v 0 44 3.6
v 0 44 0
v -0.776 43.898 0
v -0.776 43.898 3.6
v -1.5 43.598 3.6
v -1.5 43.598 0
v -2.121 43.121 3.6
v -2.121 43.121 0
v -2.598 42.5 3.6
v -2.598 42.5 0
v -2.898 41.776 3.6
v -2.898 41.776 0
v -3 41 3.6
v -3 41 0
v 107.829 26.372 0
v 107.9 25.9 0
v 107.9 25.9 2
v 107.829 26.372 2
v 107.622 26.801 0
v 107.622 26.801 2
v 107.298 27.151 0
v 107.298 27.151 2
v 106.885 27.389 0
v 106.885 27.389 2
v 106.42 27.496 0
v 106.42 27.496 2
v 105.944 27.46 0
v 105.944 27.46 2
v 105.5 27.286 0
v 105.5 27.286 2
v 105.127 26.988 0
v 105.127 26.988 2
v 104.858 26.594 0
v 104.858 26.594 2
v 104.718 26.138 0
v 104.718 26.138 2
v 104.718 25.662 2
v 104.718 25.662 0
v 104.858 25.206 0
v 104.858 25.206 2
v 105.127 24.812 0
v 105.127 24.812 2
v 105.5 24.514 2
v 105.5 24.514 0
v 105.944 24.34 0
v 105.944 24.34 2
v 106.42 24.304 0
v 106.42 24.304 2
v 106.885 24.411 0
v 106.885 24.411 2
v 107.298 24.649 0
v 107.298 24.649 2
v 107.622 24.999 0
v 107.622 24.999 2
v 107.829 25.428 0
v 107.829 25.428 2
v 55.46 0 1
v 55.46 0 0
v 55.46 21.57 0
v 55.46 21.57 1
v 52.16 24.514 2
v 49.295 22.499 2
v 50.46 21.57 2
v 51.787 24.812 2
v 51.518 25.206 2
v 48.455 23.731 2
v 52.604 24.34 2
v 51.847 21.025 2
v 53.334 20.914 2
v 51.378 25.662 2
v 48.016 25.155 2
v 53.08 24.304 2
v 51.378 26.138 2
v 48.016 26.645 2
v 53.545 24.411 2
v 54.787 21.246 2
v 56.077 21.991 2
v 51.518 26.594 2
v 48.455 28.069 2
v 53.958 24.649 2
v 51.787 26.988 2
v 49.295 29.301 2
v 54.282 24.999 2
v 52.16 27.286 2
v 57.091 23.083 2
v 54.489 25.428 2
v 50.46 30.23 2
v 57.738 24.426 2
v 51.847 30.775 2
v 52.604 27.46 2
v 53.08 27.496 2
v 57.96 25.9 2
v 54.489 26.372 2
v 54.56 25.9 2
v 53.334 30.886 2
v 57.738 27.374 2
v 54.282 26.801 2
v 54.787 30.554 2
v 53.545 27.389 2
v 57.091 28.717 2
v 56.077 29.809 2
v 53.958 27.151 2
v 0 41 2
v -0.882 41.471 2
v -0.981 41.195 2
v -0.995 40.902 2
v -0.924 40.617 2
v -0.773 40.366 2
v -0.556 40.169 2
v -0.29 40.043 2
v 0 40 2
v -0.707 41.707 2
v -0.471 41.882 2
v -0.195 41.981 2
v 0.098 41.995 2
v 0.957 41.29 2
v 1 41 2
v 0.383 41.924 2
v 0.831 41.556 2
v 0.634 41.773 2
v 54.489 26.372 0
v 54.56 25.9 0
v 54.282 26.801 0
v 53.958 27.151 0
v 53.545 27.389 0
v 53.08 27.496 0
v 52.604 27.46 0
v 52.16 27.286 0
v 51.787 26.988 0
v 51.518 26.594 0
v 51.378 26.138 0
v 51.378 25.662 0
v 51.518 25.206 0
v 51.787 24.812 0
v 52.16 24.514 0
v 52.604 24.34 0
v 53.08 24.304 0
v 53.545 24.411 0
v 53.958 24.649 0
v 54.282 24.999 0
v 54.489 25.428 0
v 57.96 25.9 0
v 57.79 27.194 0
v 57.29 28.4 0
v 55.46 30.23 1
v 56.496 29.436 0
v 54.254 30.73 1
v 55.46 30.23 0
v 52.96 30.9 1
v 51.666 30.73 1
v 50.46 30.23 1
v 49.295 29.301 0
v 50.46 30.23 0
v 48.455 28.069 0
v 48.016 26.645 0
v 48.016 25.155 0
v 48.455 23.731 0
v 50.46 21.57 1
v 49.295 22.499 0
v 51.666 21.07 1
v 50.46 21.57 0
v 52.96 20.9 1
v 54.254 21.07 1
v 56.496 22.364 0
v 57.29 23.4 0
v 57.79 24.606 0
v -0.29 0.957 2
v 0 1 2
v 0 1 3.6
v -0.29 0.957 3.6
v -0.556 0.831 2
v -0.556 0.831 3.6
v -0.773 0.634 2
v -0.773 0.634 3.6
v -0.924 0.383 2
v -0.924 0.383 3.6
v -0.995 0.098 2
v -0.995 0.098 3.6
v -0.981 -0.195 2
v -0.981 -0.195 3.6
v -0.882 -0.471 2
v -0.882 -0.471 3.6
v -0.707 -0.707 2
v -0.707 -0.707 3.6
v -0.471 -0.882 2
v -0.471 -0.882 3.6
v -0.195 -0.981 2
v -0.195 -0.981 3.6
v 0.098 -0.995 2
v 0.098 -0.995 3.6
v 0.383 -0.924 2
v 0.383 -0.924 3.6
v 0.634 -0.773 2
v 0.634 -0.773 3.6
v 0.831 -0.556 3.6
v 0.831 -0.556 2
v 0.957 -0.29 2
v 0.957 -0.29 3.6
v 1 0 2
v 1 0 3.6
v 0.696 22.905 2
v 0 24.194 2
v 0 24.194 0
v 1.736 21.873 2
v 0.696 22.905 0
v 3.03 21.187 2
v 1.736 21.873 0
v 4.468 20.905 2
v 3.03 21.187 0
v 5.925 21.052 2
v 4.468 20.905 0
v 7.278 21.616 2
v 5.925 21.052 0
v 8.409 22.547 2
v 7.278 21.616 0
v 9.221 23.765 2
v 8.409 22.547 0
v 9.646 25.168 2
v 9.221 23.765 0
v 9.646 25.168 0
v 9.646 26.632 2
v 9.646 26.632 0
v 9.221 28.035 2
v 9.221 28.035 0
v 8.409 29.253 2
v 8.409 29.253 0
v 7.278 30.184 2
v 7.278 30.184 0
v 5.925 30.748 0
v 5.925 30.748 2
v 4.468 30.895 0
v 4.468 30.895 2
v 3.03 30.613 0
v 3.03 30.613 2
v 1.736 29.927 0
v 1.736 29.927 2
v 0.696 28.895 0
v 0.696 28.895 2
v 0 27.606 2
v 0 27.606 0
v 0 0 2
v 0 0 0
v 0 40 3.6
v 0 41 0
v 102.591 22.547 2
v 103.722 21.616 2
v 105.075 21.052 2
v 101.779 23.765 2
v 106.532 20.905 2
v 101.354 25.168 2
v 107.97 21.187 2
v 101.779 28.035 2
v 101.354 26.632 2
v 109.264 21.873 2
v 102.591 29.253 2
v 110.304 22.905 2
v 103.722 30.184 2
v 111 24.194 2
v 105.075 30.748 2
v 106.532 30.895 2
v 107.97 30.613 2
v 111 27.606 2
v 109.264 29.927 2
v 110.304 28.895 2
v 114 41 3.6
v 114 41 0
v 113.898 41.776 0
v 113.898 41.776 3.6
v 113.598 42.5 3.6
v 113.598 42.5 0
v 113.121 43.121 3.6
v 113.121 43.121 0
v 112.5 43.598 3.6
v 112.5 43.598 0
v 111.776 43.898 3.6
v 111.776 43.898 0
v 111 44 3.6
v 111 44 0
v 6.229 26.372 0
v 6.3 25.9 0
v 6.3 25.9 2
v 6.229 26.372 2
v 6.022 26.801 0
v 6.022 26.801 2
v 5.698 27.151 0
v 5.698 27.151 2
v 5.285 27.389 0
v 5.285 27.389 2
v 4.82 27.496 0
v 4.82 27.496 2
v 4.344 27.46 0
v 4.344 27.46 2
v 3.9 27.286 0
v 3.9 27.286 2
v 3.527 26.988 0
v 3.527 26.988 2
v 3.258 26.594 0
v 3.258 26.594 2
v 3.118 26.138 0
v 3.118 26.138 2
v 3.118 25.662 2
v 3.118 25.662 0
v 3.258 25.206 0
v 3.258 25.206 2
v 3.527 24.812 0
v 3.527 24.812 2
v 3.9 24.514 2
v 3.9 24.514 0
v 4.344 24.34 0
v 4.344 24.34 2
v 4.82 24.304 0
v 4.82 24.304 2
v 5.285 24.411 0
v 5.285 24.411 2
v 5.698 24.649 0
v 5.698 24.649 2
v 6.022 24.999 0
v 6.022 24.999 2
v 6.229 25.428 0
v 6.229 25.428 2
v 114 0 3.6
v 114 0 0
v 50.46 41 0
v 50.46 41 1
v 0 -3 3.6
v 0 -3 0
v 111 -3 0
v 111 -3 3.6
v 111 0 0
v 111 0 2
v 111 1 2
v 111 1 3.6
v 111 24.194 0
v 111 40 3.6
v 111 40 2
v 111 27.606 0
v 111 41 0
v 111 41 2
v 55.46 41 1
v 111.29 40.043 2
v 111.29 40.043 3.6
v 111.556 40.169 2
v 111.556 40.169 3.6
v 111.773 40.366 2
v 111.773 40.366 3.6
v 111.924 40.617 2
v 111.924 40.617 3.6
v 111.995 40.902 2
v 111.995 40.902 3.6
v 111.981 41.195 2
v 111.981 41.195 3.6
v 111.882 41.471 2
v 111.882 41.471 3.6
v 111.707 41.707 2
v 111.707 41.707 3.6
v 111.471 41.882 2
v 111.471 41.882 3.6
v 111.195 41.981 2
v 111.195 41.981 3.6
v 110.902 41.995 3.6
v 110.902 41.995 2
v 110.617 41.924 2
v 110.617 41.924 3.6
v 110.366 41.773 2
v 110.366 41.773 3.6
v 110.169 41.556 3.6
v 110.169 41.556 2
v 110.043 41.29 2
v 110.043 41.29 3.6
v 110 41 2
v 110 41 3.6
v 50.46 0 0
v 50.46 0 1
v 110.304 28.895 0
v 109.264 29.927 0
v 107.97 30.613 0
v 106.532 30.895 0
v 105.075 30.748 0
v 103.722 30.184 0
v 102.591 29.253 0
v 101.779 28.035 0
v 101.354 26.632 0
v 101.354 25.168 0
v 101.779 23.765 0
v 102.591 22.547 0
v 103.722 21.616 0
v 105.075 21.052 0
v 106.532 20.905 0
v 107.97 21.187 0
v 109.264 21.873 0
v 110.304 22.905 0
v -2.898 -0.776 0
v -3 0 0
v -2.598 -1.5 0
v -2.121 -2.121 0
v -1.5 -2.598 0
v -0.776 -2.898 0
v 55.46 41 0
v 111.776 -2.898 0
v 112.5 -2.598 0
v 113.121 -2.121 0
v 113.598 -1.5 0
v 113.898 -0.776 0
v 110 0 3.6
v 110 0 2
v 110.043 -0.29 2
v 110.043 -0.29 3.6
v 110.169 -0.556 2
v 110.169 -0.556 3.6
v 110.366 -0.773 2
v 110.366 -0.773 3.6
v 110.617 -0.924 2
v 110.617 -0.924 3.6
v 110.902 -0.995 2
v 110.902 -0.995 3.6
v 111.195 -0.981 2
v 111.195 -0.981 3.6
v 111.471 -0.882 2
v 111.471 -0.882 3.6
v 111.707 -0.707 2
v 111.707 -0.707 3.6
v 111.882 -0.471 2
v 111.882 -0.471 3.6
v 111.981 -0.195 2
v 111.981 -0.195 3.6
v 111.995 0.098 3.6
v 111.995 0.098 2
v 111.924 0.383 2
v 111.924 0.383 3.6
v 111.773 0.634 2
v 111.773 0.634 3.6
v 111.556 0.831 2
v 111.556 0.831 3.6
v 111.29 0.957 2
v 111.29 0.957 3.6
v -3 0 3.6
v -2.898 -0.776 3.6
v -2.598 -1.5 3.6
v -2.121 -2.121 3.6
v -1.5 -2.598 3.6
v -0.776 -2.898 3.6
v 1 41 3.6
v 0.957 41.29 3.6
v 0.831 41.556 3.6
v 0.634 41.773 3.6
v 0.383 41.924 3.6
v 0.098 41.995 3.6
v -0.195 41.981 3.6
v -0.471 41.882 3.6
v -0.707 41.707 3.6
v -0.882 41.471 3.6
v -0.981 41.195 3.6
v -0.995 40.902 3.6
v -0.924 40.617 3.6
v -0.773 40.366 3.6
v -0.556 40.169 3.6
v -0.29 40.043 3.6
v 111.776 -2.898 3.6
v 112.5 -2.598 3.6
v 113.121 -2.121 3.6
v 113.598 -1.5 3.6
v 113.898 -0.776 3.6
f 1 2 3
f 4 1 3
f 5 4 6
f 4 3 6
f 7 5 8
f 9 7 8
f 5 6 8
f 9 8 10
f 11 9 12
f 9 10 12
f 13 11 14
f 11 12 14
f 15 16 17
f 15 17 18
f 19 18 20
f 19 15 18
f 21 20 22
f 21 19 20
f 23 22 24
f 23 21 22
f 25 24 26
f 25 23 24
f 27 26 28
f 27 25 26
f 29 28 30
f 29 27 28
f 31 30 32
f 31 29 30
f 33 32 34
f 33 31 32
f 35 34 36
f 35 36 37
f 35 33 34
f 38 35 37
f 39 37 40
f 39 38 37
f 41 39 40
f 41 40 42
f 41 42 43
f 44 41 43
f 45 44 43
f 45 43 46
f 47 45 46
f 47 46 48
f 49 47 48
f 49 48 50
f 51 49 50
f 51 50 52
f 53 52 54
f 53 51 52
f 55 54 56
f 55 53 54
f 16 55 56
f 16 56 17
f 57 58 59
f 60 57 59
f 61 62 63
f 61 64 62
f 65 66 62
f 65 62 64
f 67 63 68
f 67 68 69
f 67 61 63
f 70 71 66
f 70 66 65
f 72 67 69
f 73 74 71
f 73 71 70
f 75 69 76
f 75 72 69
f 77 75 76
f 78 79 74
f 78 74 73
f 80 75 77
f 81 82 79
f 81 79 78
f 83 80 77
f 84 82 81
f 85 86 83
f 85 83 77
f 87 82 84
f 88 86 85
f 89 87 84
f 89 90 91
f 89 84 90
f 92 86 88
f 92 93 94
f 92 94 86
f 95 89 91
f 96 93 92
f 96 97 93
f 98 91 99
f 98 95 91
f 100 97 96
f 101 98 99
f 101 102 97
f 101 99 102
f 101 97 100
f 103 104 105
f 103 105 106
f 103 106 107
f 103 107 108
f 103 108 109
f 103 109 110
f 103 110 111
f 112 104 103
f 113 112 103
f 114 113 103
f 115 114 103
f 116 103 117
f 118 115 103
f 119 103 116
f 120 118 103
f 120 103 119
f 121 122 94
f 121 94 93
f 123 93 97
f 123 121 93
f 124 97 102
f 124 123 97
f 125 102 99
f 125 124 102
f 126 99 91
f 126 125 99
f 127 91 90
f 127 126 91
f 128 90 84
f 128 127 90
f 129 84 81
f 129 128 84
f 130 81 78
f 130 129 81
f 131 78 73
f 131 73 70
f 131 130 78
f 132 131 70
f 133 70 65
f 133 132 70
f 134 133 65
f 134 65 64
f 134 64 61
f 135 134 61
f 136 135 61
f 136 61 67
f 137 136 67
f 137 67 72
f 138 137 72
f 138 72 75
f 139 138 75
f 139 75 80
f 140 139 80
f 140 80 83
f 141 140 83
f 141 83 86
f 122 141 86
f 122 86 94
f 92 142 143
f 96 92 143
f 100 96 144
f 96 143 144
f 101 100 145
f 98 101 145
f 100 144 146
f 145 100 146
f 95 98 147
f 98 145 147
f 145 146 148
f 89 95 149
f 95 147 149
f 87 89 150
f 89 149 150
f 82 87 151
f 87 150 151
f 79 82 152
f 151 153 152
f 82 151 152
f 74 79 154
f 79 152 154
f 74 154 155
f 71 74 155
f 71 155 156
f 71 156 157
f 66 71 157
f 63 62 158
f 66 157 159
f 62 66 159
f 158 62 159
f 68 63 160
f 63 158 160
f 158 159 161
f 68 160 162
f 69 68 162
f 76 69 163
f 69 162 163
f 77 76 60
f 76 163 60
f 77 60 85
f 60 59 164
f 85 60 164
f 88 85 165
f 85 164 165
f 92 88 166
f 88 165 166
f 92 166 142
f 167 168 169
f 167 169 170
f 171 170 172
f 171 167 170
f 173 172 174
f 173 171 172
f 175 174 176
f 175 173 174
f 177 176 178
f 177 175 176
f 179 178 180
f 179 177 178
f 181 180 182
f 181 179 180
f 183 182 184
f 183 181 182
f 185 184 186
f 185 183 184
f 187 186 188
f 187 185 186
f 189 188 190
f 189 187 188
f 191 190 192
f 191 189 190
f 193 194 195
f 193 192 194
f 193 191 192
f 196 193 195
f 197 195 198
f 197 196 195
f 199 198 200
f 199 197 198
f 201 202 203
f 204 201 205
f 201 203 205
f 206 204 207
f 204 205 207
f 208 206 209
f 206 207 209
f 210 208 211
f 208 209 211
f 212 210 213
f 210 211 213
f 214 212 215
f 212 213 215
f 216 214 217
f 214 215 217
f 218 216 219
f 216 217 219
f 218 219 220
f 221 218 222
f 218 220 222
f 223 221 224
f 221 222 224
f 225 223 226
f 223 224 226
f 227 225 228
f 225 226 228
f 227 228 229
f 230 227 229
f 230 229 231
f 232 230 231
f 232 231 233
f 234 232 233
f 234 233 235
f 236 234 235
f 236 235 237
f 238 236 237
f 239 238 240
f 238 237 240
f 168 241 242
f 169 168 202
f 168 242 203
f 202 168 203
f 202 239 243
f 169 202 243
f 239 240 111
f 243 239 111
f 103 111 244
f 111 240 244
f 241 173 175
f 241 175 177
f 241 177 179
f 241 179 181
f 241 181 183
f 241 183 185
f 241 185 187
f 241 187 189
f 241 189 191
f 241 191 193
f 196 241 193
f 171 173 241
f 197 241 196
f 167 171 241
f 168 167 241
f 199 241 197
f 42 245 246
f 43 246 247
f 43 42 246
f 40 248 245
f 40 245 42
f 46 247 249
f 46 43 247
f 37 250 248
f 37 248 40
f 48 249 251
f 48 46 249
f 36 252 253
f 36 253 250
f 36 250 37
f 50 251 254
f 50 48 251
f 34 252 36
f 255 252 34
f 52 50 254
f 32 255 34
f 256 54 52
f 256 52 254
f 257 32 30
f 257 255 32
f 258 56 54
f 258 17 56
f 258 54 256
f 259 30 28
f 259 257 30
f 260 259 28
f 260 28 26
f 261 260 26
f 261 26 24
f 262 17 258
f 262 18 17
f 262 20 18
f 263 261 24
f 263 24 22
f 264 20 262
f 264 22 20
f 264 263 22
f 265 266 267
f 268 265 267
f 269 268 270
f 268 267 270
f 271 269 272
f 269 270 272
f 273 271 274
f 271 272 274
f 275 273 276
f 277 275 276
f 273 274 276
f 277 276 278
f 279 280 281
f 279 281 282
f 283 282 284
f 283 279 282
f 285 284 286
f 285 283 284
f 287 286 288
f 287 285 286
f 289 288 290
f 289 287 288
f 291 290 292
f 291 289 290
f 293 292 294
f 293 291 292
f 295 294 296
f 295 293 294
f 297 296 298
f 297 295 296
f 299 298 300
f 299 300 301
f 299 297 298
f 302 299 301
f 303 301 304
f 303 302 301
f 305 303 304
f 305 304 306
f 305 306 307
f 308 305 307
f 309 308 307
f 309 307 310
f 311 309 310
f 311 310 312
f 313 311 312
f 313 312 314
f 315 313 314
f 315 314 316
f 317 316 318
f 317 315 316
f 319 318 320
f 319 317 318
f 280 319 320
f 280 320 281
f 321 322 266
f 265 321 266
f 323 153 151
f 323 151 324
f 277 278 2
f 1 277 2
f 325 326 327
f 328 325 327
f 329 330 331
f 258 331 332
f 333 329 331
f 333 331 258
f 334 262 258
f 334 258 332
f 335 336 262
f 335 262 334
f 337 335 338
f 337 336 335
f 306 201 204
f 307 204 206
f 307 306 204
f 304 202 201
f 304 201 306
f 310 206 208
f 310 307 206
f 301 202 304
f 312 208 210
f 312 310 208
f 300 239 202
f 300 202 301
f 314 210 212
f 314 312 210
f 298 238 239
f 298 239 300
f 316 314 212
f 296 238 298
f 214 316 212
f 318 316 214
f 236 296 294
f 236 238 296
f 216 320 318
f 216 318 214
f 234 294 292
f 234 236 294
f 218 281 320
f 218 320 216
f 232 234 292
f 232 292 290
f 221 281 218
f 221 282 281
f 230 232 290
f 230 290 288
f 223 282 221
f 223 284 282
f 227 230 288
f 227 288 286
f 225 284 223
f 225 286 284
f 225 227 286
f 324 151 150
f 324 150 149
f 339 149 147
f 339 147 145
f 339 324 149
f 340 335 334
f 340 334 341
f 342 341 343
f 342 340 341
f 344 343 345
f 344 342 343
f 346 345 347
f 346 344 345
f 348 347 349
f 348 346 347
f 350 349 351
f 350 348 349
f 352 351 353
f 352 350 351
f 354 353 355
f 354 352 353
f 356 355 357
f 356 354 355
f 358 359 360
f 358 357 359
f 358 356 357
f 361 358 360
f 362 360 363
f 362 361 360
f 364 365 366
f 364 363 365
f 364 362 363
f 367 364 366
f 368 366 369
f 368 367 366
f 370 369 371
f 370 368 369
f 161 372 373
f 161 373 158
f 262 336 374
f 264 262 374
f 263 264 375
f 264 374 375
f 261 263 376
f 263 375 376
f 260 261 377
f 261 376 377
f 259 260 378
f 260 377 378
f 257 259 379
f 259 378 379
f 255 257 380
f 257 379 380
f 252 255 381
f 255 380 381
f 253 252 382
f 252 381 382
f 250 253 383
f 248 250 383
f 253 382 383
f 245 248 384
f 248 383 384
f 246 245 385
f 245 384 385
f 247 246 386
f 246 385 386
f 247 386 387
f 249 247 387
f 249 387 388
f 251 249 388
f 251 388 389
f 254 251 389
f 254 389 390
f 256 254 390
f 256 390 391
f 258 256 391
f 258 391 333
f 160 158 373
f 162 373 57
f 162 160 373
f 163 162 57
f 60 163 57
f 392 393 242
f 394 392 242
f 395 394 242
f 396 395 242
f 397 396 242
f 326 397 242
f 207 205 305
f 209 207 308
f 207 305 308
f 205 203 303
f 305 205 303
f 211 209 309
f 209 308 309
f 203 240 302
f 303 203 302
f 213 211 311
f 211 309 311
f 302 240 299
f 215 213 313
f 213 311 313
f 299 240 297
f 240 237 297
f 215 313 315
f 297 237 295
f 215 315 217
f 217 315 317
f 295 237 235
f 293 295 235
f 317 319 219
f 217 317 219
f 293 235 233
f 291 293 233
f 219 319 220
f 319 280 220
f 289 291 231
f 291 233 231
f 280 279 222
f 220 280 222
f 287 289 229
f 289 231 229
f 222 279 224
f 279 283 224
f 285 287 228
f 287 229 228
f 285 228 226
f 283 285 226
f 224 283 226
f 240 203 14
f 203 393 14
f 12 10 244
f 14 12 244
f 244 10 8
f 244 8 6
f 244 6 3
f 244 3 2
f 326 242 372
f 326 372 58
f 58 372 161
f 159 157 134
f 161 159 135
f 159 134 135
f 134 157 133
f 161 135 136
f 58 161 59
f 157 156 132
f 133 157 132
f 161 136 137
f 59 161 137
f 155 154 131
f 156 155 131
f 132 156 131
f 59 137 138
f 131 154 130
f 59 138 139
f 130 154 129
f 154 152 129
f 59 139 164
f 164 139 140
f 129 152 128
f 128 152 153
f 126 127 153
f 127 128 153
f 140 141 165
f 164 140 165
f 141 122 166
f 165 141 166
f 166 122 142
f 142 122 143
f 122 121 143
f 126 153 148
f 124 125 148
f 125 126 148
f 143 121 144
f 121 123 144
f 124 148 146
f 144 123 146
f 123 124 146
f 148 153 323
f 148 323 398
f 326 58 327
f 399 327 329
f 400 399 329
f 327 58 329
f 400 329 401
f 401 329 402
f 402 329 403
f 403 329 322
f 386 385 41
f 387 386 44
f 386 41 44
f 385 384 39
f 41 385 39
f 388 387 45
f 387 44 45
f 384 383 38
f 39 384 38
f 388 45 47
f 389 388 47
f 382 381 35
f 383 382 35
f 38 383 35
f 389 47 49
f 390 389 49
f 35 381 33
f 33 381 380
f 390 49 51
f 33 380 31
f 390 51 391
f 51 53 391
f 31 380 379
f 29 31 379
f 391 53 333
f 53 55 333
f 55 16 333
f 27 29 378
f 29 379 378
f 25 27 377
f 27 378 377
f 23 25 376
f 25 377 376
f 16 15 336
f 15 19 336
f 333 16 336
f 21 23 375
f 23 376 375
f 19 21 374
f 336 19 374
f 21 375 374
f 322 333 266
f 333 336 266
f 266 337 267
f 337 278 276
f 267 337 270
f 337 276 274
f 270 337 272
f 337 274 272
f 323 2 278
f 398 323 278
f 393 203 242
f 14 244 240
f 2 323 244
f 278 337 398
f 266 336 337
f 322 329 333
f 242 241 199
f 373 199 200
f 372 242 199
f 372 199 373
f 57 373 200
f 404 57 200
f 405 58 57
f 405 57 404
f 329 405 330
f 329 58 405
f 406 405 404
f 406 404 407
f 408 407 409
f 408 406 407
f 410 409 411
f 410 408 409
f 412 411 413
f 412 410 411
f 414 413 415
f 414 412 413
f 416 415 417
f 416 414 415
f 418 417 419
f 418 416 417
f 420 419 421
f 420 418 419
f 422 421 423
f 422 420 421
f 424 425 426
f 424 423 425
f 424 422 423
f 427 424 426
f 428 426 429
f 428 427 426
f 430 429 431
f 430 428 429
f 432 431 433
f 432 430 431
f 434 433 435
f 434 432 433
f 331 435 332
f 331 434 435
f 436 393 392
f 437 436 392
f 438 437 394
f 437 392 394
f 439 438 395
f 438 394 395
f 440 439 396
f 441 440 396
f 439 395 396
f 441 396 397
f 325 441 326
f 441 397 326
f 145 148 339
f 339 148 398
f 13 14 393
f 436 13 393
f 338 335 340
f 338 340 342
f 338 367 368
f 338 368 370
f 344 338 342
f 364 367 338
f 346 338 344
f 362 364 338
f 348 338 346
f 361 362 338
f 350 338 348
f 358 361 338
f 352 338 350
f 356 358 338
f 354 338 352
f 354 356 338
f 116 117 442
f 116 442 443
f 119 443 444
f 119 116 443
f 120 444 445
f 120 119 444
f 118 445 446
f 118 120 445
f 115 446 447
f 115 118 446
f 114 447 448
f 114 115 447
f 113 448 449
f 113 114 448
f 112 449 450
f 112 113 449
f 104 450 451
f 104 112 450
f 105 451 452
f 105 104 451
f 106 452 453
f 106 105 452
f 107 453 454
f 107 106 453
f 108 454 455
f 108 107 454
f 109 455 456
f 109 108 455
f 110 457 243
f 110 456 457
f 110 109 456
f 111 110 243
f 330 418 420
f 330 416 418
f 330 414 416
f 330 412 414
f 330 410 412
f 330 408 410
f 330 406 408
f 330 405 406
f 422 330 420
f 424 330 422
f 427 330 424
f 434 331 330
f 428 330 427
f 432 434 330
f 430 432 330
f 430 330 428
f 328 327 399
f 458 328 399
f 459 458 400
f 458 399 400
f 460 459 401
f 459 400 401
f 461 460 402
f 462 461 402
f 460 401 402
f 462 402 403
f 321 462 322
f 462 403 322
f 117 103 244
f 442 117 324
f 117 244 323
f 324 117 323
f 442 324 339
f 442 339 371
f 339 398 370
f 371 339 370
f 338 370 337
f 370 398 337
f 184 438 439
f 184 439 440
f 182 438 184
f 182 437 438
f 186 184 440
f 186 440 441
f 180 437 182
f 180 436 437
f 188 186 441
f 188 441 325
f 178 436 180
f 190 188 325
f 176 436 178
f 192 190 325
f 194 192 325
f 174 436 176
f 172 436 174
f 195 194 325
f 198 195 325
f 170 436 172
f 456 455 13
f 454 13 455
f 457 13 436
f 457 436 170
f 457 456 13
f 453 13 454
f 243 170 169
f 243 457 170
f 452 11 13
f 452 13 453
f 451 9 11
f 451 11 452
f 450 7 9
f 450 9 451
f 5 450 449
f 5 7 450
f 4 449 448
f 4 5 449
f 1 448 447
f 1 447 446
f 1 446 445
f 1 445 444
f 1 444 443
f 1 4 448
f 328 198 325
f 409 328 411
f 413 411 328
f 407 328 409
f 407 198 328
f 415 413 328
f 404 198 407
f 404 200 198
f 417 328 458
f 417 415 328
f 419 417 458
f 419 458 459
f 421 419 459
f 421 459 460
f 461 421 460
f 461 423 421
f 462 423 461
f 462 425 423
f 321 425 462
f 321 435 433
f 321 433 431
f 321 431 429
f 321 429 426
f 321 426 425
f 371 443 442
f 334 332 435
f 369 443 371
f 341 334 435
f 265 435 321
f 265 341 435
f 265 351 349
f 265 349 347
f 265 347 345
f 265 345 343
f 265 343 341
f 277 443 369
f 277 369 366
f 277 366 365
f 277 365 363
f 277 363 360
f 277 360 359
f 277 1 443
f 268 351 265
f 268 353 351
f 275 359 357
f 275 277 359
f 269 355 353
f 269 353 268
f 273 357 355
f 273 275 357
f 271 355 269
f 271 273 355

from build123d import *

# Parameters (mm, degrees)
SKETCH005_W     = 111
SKETCH005_H     = 41
PAD002_DEPTH    = 3.6
SKETCH006_R     = 5
SKETCH006_R_2   = 1.6
PAD003_DEPTH    = 2
SKETCH007_R     = 1
POCKET001_DEPTH = 5
SKETCH008_W     = 5
SKETCH008_H     = 41
SKETCH008_R     = 1.6
PAD004_DEPTH    = 1


with BuildPart() as part:
    # Sketch005 → Pad002 (new body)
    with BuildSketch(Plane.XY):
        with BuildLine():
            Line((0, -3), (111, -3))
            ThreePointArc((111, -3), (113.12132, -2.12132), (114, 0))
            Line((114, 0), (114, 41))
            ThreePointArc((114, 41), (113.12132, 43.12132), (111, 44))
            Line((111, 44), (0, 44))
            ThreePointArc((0, 44), (-2.12132, 43.12132), (-3, 41))
            Line((-3, 41), (-3, 0))
            ThreePointArc((-3, 0), (-2.12132, -2.12132), (0, -3))
        make_face()
        with Locations((55.5, 20.5)):
            Rectangle(SKETCH005_W, SKETCH005_H, mode=Mode.SUBTRACT)
    extrude(amount=PAD002_DEPTH)

    # Sketch006 → Pad003 (join)
    with BuildSketch(Plane.XY):
        with Locations((4.7, 25.9)):
            Circle(SKETCH006_R)
        with Locations((4.7, 25.9)):
            Circle(SKETCH006_R_2, mode=Mode.SUBTRACT)
        with Locations((106.3, 25.9)):
            Circle(SKETCH006_R)
        with Locations((106.3, 25.9)):
            Circle(SKETCH006_R_2, mode=Mode.SUBTRACT)
        with Locations((52.96, 25.9)):
            Circle(SKETCH006_R)
        with Locations((52.96, 25.9)):
            Circle(SKETCH006_R_2, mode=Mode.SUBTRACT)
    extrude(amount=PAD003_DEPTH)

    # Sketch007 → Pocket001 (cut)
    with BuildSketch(Plane.XY.offset(2)):
        with Locations((0, 41)):
            Circle(SKETCH007_R)
        with Locations((111, 41)):
            Circle(SKETCH007_R)
        with Locations((111, 0)):
            Circle(SKETCH007_R)
        Circle(SKETCH007_R)
    extrude(amount=POCKET001_DEPTH, mode=Mode.SUBTRACT)

    # Sketch008 → Pad004 (join)
    with BuildSketch(Plane.XY):
        with Locations((52.96, 20.5)):
            Rectangle(SKETCH008_W, SKETCH008_H)
        with Locations((52.96, 25.9)):
            Circle(SKETCH008_R, mode=Mode.SUBTRACT)
    extrude(amount=PAD004_DEPTH)


solid = part.part
